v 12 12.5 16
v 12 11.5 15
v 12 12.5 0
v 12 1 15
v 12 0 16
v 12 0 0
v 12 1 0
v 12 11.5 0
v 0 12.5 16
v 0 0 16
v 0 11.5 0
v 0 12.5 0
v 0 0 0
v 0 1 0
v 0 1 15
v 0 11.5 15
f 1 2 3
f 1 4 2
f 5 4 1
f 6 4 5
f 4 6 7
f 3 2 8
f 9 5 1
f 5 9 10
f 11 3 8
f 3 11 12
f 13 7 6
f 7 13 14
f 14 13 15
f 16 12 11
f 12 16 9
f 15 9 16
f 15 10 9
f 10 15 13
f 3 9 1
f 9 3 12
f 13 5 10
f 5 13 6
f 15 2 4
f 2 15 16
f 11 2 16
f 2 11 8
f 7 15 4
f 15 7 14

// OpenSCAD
thickness = 1;
height = 16;
depth = 12;
inner_width = 10.5;
width = inner_width + (2 * thickness);

module camlock() {
  difference() {
    cube([depth, width, height]);
    translate([-thickness, thickness, -thickness])
      cube([depth + (2*thickness), inner_width, height]);
  }
}

camlock();
